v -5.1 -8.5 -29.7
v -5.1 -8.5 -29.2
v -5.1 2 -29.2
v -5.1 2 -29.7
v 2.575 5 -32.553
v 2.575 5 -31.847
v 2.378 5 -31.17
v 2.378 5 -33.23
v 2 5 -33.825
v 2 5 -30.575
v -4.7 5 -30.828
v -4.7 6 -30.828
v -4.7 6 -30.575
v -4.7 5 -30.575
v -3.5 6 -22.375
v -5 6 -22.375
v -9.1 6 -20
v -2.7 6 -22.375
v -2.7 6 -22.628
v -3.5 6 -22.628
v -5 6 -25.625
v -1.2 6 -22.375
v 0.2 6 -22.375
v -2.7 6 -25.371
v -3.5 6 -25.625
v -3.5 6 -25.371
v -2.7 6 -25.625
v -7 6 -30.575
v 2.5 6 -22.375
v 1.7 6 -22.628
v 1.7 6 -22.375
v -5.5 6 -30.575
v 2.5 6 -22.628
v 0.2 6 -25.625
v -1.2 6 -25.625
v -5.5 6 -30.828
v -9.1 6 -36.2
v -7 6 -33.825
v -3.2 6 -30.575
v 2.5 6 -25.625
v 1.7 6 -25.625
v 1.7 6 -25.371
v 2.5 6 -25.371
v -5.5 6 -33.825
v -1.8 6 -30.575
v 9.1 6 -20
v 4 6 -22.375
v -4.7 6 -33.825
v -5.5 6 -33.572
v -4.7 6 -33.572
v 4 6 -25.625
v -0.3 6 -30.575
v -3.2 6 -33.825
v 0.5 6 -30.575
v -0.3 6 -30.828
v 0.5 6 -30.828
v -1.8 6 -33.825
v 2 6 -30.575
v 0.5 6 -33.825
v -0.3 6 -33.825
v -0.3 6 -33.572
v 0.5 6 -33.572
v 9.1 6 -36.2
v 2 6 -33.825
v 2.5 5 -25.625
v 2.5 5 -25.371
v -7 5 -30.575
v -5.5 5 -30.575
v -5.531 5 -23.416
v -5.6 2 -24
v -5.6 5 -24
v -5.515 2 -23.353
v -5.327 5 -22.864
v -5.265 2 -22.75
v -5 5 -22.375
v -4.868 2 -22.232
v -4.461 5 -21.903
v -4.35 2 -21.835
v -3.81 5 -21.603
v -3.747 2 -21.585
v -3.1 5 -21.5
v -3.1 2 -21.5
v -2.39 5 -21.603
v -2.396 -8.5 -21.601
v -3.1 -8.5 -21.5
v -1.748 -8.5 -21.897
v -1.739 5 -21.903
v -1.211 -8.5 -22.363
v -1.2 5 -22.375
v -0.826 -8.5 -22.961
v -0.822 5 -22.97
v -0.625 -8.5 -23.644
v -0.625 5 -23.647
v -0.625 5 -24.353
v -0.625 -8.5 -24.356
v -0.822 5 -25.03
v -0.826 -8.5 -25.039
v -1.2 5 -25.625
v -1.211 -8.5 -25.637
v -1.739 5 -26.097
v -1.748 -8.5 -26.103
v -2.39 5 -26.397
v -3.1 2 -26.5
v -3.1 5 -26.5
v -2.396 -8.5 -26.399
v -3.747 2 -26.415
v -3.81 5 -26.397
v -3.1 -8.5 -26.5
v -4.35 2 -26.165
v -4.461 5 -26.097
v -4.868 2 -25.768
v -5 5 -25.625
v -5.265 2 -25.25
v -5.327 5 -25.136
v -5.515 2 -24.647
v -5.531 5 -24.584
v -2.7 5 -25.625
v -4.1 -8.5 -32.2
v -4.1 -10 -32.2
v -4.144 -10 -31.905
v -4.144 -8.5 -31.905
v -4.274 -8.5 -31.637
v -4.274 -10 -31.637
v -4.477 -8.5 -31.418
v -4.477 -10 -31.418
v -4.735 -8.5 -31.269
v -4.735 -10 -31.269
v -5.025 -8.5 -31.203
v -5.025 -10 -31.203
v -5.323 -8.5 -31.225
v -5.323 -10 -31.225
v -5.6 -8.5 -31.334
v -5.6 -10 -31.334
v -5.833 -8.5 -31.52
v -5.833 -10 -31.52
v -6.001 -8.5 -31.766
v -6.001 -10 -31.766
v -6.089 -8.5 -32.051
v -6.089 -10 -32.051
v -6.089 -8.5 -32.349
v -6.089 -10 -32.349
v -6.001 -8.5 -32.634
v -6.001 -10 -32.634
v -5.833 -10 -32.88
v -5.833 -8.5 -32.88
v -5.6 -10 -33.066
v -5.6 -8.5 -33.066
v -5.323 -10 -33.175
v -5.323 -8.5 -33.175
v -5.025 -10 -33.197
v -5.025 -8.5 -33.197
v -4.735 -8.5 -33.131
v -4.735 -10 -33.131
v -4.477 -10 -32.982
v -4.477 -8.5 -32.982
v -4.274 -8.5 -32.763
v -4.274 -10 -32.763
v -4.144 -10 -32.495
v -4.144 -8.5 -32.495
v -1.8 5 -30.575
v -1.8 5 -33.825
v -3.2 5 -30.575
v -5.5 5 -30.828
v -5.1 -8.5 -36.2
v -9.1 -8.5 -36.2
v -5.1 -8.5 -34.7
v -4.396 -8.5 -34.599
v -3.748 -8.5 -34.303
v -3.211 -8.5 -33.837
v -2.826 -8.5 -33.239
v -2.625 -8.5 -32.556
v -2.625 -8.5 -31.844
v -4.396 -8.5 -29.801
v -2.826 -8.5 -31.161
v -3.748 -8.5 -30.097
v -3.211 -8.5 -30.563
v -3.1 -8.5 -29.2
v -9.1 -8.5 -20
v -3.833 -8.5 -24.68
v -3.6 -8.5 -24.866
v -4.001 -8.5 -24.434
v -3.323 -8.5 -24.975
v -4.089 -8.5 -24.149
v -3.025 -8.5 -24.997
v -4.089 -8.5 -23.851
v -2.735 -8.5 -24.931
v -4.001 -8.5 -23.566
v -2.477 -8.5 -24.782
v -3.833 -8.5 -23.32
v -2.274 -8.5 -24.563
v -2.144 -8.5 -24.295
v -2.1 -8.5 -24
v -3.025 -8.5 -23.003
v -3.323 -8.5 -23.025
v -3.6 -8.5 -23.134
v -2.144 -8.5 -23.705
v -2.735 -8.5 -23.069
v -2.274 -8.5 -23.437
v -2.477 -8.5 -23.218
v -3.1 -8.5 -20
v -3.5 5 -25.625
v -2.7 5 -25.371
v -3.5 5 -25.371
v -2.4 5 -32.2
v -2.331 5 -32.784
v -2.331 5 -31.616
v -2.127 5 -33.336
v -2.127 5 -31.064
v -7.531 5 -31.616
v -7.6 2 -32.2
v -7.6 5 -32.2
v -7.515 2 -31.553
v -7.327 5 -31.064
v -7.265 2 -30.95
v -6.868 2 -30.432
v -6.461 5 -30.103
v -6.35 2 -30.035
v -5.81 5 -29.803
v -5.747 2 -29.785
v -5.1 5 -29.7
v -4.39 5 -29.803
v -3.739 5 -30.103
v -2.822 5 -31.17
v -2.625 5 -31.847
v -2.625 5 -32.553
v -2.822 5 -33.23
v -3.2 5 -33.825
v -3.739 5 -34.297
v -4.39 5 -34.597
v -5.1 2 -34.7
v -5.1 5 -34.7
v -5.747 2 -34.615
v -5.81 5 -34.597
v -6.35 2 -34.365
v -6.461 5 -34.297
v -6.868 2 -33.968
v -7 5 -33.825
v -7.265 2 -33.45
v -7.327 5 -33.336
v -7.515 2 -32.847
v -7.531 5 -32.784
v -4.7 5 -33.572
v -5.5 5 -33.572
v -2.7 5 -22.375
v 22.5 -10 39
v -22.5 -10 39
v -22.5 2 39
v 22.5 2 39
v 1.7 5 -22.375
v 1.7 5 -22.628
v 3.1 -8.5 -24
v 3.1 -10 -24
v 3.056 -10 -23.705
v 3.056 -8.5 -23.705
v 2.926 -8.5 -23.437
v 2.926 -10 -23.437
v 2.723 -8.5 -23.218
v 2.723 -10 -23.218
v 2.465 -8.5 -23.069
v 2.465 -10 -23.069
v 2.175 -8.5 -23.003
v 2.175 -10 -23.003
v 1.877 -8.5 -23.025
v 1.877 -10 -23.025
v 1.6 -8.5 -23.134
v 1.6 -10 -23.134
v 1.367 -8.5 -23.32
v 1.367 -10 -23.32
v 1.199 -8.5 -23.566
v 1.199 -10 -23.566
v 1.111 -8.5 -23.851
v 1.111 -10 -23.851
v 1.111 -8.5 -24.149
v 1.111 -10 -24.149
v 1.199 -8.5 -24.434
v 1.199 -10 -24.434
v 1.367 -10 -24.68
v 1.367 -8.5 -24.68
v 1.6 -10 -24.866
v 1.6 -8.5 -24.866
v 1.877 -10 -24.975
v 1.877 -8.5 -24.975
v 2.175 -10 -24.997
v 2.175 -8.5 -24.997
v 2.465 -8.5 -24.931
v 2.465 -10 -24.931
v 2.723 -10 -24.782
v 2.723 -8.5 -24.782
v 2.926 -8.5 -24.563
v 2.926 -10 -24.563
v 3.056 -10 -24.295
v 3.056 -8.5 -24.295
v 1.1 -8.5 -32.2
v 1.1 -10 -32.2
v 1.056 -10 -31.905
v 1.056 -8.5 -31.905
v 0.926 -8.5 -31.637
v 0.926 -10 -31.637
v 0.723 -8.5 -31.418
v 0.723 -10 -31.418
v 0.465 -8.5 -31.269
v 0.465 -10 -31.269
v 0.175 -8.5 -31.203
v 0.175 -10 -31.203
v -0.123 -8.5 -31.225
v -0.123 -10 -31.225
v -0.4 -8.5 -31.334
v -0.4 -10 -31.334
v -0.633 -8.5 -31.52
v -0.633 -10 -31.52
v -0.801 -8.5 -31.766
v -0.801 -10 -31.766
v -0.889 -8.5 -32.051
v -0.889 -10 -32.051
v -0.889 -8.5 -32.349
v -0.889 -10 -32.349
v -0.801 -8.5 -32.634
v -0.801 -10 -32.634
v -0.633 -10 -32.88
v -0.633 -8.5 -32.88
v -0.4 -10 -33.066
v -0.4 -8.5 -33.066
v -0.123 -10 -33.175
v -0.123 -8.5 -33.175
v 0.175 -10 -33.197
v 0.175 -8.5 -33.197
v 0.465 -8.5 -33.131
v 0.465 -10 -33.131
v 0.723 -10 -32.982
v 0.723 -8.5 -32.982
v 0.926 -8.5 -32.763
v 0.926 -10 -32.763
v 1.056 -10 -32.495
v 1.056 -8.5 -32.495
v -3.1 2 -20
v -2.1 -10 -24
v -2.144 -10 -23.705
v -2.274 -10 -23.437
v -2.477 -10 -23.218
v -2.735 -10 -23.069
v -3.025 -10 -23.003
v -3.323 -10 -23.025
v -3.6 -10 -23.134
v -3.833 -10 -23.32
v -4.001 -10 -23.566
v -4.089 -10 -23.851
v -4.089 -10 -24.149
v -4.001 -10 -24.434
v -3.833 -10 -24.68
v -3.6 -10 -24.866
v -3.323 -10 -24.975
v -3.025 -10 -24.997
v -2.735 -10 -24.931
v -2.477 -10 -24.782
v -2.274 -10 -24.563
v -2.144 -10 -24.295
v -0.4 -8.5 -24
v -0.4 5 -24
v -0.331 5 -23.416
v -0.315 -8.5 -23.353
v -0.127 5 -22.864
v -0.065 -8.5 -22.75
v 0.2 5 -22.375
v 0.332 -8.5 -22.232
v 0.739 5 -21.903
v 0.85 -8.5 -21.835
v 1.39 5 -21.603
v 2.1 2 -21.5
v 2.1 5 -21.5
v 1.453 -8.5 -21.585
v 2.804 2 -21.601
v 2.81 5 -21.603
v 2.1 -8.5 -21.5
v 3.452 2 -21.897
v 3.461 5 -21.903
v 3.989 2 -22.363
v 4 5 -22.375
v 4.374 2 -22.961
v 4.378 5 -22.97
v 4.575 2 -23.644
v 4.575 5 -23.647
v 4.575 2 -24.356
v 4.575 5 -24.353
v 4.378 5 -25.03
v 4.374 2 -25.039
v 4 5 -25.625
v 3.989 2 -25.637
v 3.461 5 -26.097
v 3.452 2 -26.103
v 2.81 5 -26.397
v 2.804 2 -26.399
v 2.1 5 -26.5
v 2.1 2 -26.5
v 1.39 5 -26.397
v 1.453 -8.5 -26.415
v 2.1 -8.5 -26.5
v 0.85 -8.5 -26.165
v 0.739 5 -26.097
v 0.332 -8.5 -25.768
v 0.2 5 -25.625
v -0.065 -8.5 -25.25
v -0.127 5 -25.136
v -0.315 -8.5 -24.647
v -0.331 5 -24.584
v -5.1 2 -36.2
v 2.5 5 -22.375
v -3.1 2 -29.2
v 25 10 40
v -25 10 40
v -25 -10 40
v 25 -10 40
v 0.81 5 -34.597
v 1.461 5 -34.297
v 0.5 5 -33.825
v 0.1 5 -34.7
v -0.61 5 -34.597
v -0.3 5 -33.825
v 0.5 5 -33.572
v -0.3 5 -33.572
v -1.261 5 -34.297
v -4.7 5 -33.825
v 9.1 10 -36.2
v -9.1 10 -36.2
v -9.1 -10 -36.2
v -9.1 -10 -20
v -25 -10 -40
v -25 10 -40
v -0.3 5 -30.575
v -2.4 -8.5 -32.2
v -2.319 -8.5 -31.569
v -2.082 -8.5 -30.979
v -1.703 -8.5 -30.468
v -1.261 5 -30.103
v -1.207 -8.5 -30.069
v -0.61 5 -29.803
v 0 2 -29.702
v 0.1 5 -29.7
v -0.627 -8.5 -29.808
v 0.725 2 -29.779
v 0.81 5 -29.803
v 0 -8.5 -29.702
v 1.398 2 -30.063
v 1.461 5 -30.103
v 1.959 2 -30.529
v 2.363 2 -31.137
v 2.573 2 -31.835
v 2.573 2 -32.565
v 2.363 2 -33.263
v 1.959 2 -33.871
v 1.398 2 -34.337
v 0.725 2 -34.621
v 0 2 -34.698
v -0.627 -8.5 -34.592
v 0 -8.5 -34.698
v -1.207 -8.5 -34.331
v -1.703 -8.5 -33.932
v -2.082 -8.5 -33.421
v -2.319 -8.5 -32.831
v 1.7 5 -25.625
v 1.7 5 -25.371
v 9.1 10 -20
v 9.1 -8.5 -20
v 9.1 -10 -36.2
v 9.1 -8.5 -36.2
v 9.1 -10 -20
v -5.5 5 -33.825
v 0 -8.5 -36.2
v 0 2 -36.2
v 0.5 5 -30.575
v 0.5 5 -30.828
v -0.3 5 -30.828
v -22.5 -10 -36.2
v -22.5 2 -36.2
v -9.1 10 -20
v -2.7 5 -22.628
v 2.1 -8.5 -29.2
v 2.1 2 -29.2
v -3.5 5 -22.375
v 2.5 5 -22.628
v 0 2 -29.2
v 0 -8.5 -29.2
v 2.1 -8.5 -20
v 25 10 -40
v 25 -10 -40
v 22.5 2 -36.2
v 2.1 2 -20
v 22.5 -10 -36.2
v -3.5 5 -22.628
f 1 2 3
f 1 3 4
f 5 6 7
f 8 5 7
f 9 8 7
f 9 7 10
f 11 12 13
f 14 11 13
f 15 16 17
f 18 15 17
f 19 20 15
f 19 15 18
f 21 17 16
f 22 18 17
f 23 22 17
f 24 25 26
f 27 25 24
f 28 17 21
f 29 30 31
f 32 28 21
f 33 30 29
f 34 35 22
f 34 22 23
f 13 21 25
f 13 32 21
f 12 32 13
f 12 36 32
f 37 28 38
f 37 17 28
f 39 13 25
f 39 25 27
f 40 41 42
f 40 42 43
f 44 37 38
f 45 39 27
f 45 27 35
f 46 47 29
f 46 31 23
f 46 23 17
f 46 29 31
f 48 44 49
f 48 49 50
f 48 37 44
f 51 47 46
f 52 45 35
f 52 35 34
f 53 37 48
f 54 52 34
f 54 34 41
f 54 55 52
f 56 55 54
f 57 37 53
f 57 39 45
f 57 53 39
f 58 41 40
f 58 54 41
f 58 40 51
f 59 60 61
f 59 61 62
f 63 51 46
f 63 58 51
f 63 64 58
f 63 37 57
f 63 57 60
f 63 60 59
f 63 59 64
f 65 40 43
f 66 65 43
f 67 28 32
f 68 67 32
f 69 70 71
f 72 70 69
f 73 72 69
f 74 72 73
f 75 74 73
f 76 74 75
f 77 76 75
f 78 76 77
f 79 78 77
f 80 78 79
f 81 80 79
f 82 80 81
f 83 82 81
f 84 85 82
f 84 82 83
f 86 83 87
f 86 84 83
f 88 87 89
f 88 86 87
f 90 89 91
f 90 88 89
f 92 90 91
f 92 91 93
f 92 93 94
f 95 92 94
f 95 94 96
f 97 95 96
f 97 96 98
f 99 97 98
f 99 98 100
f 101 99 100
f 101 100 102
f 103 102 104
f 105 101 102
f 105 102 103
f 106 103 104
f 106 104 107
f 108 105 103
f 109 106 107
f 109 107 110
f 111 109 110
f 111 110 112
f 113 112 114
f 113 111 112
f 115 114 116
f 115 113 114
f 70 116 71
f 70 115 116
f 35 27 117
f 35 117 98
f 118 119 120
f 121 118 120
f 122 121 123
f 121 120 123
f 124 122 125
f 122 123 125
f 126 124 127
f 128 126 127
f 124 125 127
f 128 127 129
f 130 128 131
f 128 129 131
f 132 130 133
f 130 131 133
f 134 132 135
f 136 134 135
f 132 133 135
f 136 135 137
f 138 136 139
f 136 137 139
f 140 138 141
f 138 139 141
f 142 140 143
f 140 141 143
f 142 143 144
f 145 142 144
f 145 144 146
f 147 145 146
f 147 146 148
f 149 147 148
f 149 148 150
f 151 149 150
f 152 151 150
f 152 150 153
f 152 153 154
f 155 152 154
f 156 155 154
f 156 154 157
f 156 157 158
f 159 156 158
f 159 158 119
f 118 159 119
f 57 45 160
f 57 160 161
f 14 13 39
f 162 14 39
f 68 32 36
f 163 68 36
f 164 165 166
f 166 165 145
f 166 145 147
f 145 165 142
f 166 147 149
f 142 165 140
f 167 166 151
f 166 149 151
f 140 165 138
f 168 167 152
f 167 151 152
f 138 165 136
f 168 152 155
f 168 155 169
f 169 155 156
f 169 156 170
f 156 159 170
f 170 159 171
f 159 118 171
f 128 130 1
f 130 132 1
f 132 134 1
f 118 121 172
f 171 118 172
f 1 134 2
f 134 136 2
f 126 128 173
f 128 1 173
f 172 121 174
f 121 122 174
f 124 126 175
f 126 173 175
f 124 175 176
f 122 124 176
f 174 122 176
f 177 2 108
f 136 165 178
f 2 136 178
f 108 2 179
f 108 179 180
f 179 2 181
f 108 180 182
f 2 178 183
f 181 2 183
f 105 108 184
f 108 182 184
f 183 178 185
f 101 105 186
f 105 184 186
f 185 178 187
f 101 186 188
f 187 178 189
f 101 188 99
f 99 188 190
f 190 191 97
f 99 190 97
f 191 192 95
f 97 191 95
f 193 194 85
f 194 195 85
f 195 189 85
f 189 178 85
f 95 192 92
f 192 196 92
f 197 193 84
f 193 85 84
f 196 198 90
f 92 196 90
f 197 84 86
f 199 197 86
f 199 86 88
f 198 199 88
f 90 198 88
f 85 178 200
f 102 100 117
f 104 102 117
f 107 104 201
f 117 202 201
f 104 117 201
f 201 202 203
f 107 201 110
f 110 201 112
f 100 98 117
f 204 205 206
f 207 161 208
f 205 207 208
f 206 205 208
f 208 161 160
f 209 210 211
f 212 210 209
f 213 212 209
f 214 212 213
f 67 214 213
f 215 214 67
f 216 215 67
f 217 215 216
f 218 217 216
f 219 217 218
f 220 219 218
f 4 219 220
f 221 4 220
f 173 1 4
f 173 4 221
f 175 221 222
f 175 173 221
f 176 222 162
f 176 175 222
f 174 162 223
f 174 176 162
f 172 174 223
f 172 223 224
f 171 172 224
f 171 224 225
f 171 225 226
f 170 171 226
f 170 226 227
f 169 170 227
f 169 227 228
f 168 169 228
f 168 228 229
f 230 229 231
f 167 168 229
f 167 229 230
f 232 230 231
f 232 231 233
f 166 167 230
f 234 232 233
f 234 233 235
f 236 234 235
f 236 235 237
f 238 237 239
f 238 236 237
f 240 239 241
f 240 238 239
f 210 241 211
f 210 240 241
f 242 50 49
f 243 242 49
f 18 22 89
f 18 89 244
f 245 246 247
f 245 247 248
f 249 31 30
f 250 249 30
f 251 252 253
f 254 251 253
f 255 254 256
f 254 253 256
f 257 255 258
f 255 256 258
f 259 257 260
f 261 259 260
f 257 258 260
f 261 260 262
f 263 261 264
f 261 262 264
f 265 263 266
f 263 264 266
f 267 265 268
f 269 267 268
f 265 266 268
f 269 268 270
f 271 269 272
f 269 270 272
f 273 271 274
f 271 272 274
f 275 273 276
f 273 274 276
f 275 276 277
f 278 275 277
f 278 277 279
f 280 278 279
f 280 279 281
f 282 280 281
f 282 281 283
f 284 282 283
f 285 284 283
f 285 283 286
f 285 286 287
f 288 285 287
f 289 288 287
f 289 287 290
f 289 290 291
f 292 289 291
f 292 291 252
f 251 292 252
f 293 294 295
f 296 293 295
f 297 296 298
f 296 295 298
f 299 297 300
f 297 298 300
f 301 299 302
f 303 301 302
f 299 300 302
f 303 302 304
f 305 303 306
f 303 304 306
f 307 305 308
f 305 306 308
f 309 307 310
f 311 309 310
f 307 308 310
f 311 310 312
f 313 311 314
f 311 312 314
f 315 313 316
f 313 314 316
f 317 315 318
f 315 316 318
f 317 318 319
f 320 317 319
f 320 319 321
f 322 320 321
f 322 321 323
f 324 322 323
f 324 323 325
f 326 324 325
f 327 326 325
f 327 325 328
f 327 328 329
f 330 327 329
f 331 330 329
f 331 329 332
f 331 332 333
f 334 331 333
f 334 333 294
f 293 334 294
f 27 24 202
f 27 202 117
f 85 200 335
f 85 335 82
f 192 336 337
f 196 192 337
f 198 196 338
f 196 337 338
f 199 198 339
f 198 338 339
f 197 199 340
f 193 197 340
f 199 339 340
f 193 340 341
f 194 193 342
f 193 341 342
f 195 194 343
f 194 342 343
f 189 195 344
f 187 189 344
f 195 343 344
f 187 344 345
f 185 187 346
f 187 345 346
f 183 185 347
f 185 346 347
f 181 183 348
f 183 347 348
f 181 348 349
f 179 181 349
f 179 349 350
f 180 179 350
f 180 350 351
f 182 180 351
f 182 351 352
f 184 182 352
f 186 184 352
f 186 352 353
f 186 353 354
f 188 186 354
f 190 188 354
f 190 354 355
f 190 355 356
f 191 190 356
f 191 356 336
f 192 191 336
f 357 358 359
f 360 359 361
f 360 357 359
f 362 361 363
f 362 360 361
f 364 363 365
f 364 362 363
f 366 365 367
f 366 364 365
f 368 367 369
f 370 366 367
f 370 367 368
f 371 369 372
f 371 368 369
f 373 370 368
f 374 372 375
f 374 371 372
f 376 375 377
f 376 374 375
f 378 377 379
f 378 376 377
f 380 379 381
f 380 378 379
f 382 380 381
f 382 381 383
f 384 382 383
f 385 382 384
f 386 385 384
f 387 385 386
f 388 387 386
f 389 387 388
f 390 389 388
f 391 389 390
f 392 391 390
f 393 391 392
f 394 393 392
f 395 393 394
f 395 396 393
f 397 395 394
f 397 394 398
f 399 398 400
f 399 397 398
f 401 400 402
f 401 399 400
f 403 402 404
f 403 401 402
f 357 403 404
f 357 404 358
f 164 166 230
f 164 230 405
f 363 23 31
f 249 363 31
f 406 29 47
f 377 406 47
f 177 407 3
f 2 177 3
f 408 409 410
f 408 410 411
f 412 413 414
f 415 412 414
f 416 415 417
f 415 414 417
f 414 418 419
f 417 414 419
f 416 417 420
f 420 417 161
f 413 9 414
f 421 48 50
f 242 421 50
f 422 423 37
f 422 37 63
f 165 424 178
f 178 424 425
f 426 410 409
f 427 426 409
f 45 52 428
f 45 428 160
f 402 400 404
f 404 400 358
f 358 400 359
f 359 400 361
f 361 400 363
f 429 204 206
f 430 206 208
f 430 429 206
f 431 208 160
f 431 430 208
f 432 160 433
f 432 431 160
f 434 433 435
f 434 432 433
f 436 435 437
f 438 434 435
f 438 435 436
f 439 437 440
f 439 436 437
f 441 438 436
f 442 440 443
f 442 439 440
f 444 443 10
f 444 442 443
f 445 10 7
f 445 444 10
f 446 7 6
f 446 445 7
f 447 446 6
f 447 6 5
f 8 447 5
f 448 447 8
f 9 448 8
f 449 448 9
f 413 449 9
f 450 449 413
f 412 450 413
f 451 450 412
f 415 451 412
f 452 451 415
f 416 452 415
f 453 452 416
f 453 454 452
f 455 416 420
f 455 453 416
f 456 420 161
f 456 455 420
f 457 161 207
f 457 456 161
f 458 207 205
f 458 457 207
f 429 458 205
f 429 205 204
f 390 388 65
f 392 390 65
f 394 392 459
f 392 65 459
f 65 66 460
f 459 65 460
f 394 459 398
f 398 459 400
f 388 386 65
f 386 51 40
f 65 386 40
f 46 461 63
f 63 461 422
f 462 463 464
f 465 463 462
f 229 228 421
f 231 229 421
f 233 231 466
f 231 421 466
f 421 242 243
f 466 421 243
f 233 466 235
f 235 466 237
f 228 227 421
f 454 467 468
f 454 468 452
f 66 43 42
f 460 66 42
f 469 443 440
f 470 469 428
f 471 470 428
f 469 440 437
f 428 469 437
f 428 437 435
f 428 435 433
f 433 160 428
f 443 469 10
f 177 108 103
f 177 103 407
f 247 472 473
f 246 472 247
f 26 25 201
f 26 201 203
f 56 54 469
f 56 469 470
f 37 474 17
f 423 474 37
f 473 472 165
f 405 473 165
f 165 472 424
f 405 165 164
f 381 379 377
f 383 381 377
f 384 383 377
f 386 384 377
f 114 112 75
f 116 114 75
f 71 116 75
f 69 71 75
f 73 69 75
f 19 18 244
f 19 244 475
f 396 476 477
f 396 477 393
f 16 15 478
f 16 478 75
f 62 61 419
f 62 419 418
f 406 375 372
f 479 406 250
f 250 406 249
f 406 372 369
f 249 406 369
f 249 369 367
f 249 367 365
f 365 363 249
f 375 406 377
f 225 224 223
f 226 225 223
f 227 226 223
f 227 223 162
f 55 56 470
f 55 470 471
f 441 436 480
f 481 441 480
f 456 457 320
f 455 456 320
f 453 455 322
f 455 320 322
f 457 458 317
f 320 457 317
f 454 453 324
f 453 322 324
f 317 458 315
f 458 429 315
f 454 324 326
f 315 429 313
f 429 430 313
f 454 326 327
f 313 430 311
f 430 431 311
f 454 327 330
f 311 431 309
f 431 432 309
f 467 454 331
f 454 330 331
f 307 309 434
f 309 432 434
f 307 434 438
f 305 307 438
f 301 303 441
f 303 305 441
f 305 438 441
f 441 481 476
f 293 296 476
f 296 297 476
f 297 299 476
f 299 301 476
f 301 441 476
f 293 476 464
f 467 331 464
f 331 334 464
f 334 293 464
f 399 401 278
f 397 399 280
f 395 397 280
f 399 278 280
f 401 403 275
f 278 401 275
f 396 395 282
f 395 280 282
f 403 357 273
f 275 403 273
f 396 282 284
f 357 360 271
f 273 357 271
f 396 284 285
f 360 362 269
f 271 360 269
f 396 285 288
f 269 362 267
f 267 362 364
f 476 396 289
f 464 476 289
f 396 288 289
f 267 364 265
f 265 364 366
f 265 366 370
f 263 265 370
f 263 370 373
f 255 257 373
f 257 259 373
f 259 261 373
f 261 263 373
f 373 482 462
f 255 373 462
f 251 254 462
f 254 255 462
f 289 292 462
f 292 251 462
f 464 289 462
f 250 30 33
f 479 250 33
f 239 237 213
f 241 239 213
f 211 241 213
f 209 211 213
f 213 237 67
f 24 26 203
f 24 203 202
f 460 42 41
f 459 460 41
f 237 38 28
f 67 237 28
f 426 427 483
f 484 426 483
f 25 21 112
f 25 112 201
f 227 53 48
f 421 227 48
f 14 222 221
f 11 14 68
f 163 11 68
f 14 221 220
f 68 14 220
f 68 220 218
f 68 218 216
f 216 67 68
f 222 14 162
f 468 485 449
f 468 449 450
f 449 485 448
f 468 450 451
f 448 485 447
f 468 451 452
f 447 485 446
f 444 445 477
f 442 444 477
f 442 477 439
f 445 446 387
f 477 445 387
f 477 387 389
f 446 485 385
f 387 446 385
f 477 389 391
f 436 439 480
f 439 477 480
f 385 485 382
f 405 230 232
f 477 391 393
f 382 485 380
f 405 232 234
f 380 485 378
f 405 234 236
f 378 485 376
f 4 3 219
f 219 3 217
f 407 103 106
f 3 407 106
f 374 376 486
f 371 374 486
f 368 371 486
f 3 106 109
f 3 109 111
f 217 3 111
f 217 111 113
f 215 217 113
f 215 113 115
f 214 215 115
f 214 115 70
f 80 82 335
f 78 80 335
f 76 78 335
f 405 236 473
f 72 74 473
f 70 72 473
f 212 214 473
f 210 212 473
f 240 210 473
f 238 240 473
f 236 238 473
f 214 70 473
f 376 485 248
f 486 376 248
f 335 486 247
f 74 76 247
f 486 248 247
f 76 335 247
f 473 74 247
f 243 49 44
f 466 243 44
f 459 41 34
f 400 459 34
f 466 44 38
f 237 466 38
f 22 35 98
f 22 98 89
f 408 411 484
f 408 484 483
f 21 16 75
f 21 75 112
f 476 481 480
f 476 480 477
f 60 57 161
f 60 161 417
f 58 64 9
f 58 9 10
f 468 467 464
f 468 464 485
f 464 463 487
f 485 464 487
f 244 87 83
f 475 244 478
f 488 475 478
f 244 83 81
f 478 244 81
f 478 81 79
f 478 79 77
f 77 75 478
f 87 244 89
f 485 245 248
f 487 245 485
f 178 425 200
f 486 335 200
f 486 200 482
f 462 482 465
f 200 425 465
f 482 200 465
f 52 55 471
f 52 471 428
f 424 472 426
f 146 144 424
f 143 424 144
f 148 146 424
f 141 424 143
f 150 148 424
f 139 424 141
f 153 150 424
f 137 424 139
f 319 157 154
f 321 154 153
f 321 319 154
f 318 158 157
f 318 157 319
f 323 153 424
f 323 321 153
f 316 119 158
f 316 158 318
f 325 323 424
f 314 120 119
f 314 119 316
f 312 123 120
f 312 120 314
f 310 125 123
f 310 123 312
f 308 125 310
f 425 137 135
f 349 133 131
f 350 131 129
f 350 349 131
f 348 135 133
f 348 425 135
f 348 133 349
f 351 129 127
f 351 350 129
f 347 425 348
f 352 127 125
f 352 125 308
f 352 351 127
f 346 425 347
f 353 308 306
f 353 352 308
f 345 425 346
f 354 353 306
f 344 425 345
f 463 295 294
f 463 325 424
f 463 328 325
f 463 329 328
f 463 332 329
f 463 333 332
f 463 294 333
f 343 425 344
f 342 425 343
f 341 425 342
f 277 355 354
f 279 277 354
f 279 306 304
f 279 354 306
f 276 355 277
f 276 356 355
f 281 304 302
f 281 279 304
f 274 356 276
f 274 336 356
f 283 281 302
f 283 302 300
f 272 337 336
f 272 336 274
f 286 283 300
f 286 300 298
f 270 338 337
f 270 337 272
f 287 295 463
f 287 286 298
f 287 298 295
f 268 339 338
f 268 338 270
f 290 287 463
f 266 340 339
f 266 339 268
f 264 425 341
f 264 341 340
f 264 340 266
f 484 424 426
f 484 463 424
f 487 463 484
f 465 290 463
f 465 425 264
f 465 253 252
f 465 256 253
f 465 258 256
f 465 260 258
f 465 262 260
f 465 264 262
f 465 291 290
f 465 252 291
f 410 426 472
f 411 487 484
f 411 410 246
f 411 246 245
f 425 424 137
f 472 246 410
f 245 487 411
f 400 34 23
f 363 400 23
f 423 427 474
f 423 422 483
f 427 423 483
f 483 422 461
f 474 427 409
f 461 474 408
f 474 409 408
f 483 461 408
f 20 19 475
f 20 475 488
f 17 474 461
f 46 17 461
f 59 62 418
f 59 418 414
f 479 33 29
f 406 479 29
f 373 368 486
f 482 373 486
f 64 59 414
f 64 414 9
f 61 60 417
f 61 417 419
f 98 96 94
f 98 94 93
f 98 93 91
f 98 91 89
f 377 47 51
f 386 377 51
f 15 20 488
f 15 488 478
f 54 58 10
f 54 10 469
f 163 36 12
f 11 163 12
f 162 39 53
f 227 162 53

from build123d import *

# Parameters (mm, degrees)
SKETCH1_W           = 50
SKETCH1_H           = 20
BOSS_EXTRUDE1_DEPTH = 40
SKETCH2_W           = 18.2
SKETCH2_H           = 16.2
CUT_EXTRUDE1_DEPTH  = 4
CUT_EXTRUDE2_START  = -16
SKETCH3_R           = 2.5
CUT_EXTRUDE2_DEPTH  = 15
CUT_EXTRUDE3_DEPTH  = 1
CUT_EXTRUDE4_DEPTH  = 12
SKETCH7_W           = 18.2
SKETCH7_H           = 16.2
BOSS_EXTRUDE3_DEPTH = 1.5
CUT_EXTRUDE5_REACH  = 53.235
SKETCH8_R           = 1


with BuildPart() as part:
    # Sketch1 → Boss-Extrude1 (new, symmetric)
    with BuildSketch(Plane.XY):
        Rectangle(SKETCH1_W, SKETCH1_H)
    extrude(amount=BOSS_EXTRUDE1_DEPTH, both=True)

    # Sketch2 → Cut-Extrude1 (cut)
    with BuildSketch(Plane(origin=(0, 10, 0), x_dir=(1, 0, 0), z_dir=(0, 1, 0))):
        with Locations((0, 28.1)):
            Rectangle(SKETCH2_W, SKETCH2_H)
    extrude(amount=-CUT_EXTRUDE1_DEPTH, mode=Mode.SUBTRACT)

    # Sketch3 → Cut-Extrude2 (cut)
    with BuildSketch(Plane(origin=(0, 6, 0), x_dir=(1, 0, 0), z_dir=(0, 1, 0)).offset(CUT_EXTRUDE2_START)):
        with Locations(Location((-5.1, 32.2, 0), (0, 0, 180))):
            Circle(SKETCH3_R)
        with Locations(Location((0.1, 32.2, 0), (0, 0, 180))):
            Circle(SKETCH3_R)
        with Locations(Location((-3.1, 24, 0), (0, 0, 180))):
            Circle(SKETCH3_R)
        with Locations(Location((2.1, 24, 0), (0, 0, 180))):
            Circle(SKETCH3_R)
    extrude(amount=CUT_EXTRUDE2_DEPTH, mode=Mode.SUBTRACT)

    # Sketch4 → Cut-Extrude3 (cut)
    with BuildSketch(Plane(origin=(0, 6, 0), x_dir=(1, 0, 0), z_dir=(0, 1, 0))):
        Polygon((-5.5, 33.824807681), (-7, 33.824807681), (-7, 30.575192319), (-5.5, 30.575192319), (-5.5, 30.828384848), (-4.7, 30.828384848), (-4.7, 30.575192319), (-3.2, 30.575192319), (-3.2, 33.824807681), (-4.7, 33.824807681), (-4.7, 33.571615152), (-5.5, 33.571615152), align=None)
        Polygon((0.5, 30.575192319), (0.5, 30.828384848), (-0.3, 30.828384848), (-0.3, 30.575192319), (-1.8, 30.575192319), (-1.8, 33.824807681), (-0.3, 33.824807681), (-0.3, 33.571615152), (0.5, 33.571615152), (0.5, 33.824807681), (2, 33.824807681), (2, 30.575192319), align=None)
        Polygon((2.5, 22.375192325), (4.000000005, 22.375192325), (3.999999995, 25.624807687), (2.5, 25.624683497), (2.5, 25.371490969), (1.7, 25.371490983), (1.7, 25.624683512), (0.199999995, 25.624807675), (0.200000005, 22.375192313), (1.699999991, 22.37506815), (1.699999991, 22.628260678), (2.5, 22.628384854), align=None)
        Polygon((-3.5, 25.624683497), (-3.5, 25.371490969), (-2.7, 25.371490983), (-2.7, 25.624683512), (-1.199999995, 25.624807675), (-1.200000005, 22.375192313), (-2.699999991, 22.37506815), (-2.699999991, 22.628260678), (-3.5, 22.628384854), (-3.5, 22.375192325), (-5.000000005, 22.375192325), (-4.999999995, 25.624807687), align=None)
    extrude(amount=-CUT_EXTRUDE3_DEPTH, mode=Mode.SUBTRACT)

    # Sketch6 → Cut-Extrude4 (cut)
    with BuildSketch(Plane.XZ.offset(10)):
        Polygon((22.5, -36.2), (4, -36.2), (0, -36.2), (0, -29.2), (2.1, -29.2), (2.099999991, -20), (-3.1, -20), (-3.1, -29.2), (-5.1, -29.2), (-5.1, -36.2), (-9.1, -36.2), (-22.5, -36.2), (-22.5, 39), (22.5, 39), align=None)
    extrude(amount=-CUT_EXTRUDE4_DEPTH, mode=Mode.SUBTRACT)

    # Sketch7 → Boss-Extrude3 (add)
    with BuildSketch(Plane.XZ.offset(10)):
        with Locations((0, -28.1)):
            Rectangle(SKETCH7_W, SKETCH7_H)
    extrude(amount=-BOSS_EXTRUDE3_DEPTH)

    # Sketch8 → Cut-Extrude5 (cut, up to next)
    with BuildSketch(Plane.XZ.offset(10), mode=Mode.PRIVATE) as cut_extrude5_sk1:
        with Locations((-3.099999996, -24.000000006)):
            Circle(SKETCH8_R)
    cut_extrude5_tool1 = extrude(cut_extrude5_sk1.sketch, amount=-CUT_EXTRUDE5_REACH, mode=Mode.PRIVATE) & part.part
    # Sketch8 → Cut-Extrude5 (cut, up to next)
    with BuildSketch(Plane.XZ.offset(10), mode=Mode.PRIVATE) as cut_extrude5_sk2:
        with Locations((2.099999996, -24.000000006)):
            Circle(SKETCH8_R)
    cut_extrude5_tool2 = extrude(cut_extrude5_sk2.sketch, amount=-CUT_EXTRUDE5_REACH, mode=Mode.PRIVATE) & part.part
    # Sketch8 → Cut-Extrude5 (cut, up to next)
    with BuildSketch(Plane.XZ.offset(10), mode=Mode.PRIVATE) as cut_extrude5_sk3:
        with Locations((-5.1, -32.2)):
            Circle(SKETCH8_R)
    cut_extrude5_tool3 = extrude(cut_extrude5_sk3.sketch, amount=-CUT_EXTRUDE5_REACH, mode=Mode.PRIVATE) & part.part
    # Sketch8 → Cut-Extrude5 (cut, up to next)
    with BuildSketch(Plane.XZ.offset(10), mode=Mode.PRIVATE) as cut_extrude5_sk4:
        with Locations((0.1, -32.2)):
            Circle(SKETCH8_R)
    cut_extrude5_tool4 = extrude(cut_extrude5_sk4.sketch, amount=-CUT_EXTRUDE5_REACH, mode=Mode.PRIVATE) & part.part
    add(cut_extrude5_tool1.solids().sort_by_distance((-3.1, -10, -24))[0], mode=Mode.SUBTRACT)
    add(cut_extrude5_tool2.solids().sort_by_distance((2.1, -10, -24))[0], mode=Mode.SUBTRACT)
    add(cut_extrude5_tool3.solids().sort_by_distance((-5.1, -10, -32.2))[0], mode=Mode.SUBTRACT)
    add(cut_extrude5_tool4.solids().sort_by_distance((0.1, -10, -32.2))[0], mode=Mode.SUBTRACT)


solid = part.part
